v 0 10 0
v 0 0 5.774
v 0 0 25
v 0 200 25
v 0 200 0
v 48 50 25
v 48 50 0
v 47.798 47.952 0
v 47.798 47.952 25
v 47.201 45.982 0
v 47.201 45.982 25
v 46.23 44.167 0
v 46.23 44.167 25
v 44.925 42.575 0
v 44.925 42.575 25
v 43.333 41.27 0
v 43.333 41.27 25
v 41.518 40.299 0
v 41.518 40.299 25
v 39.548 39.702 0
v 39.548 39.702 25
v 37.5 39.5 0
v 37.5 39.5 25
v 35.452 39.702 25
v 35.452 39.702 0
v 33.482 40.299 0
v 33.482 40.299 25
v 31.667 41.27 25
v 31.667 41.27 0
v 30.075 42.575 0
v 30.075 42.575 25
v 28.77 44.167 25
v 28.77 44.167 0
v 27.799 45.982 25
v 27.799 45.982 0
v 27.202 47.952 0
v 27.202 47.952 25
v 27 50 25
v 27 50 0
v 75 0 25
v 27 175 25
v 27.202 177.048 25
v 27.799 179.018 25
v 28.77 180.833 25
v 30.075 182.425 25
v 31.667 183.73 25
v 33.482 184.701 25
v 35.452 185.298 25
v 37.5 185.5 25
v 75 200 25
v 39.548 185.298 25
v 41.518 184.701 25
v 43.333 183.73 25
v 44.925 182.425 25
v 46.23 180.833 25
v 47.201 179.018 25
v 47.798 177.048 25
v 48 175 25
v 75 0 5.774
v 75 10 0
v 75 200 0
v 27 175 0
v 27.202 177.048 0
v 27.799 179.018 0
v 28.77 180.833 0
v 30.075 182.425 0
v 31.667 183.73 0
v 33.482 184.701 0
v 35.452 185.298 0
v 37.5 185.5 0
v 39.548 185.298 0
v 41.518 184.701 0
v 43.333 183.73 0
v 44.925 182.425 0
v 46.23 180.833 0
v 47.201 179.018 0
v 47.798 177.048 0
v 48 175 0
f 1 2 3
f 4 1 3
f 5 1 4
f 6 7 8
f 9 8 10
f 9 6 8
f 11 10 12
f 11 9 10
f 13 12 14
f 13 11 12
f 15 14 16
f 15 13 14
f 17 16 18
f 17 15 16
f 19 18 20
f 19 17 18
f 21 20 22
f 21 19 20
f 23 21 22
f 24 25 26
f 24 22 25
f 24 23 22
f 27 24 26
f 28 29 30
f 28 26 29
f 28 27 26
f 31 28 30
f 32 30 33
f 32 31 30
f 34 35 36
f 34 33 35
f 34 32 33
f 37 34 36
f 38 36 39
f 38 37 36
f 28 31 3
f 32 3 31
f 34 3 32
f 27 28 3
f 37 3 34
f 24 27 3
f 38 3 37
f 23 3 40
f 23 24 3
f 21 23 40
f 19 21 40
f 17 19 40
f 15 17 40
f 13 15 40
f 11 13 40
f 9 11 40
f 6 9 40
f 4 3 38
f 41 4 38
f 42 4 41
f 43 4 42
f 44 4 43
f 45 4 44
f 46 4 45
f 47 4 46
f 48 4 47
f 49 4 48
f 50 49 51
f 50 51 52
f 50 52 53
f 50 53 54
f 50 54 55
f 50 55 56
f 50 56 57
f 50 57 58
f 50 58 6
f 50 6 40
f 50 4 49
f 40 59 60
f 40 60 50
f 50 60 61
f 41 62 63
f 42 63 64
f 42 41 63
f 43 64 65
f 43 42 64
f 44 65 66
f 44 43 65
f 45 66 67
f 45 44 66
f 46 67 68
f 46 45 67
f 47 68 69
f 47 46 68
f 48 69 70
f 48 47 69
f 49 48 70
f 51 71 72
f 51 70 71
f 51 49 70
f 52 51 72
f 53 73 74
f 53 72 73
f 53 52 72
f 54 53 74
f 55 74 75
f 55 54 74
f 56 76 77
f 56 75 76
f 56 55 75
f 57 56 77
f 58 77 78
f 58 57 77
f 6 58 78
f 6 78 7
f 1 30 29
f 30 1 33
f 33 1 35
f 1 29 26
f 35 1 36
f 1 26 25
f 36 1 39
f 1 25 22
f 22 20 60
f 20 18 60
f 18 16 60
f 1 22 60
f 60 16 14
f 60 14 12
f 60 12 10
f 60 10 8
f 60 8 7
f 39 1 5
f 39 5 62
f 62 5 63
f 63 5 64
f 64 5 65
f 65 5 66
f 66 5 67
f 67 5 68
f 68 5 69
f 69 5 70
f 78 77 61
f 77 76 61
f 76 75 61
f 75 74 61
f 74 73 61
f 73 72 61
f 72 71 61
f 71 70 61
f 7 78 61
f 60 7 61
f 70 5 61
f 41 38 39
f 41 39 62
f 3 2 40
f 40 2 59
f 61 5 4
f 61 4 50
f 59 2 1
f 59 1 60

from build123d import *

# Parameters (mm, degrees)
SKETCH_1_W          = 75
SKETCH_1_H          = 200
EXTRUDE_1_DEPTH     = 25
CUT_EXTRUDE_1_DEPTH = 26
CHAMFER_1_SIZE      = 10
CHAMFER_1_SIZE2     = 5.773502692


with BuildPart() as part:
    # Эскиз1 → Бобышка-Вытянуть1 (new body)
    with BuildSketch(Plane.XY):
        with Locations((37.5, 100)):
            Rectangle(SKETCH_1_W, SKETCH_1_H)
    extrude(amount=EXTRUDE_1_DEPTH)

    # Эскиз2 → Вырез-Вытянуть1 (cut, through all)
    with BuildSketch(Plane.XY.offset(25)):
        with BuildLine():
            Line((27, 50), (27, 175))
            ThreePointArc((27, 175), (37.5, 185.5), (48, 175))
            Line((48, 175), (48, 50))
            ThreePointArc((48, 50), (37.5, 39.5), (27, 50))
        make_face()
    extrude(amount=-CUT_EXTRUDE_1_DEPTH, mode=Mode.SUBTRACT)

    # Фаска1
    chamfer_1_edges = [part.edges().sort_by_distance(p)[0] for p in [
        (37.5, 0, 0),
    ]]
    chamfer_1_side = [part.faces().sort_by_distance(p)[0] for p in [
        (37.5, 2.136000936, 0),
    ]]
    chamfer(chamfer_1_edges, length=CHAMFER_1_SIZE, length2=CHAMFER_1_SIZE2, reference=chamfer_1_side[0])


solid = part.part
